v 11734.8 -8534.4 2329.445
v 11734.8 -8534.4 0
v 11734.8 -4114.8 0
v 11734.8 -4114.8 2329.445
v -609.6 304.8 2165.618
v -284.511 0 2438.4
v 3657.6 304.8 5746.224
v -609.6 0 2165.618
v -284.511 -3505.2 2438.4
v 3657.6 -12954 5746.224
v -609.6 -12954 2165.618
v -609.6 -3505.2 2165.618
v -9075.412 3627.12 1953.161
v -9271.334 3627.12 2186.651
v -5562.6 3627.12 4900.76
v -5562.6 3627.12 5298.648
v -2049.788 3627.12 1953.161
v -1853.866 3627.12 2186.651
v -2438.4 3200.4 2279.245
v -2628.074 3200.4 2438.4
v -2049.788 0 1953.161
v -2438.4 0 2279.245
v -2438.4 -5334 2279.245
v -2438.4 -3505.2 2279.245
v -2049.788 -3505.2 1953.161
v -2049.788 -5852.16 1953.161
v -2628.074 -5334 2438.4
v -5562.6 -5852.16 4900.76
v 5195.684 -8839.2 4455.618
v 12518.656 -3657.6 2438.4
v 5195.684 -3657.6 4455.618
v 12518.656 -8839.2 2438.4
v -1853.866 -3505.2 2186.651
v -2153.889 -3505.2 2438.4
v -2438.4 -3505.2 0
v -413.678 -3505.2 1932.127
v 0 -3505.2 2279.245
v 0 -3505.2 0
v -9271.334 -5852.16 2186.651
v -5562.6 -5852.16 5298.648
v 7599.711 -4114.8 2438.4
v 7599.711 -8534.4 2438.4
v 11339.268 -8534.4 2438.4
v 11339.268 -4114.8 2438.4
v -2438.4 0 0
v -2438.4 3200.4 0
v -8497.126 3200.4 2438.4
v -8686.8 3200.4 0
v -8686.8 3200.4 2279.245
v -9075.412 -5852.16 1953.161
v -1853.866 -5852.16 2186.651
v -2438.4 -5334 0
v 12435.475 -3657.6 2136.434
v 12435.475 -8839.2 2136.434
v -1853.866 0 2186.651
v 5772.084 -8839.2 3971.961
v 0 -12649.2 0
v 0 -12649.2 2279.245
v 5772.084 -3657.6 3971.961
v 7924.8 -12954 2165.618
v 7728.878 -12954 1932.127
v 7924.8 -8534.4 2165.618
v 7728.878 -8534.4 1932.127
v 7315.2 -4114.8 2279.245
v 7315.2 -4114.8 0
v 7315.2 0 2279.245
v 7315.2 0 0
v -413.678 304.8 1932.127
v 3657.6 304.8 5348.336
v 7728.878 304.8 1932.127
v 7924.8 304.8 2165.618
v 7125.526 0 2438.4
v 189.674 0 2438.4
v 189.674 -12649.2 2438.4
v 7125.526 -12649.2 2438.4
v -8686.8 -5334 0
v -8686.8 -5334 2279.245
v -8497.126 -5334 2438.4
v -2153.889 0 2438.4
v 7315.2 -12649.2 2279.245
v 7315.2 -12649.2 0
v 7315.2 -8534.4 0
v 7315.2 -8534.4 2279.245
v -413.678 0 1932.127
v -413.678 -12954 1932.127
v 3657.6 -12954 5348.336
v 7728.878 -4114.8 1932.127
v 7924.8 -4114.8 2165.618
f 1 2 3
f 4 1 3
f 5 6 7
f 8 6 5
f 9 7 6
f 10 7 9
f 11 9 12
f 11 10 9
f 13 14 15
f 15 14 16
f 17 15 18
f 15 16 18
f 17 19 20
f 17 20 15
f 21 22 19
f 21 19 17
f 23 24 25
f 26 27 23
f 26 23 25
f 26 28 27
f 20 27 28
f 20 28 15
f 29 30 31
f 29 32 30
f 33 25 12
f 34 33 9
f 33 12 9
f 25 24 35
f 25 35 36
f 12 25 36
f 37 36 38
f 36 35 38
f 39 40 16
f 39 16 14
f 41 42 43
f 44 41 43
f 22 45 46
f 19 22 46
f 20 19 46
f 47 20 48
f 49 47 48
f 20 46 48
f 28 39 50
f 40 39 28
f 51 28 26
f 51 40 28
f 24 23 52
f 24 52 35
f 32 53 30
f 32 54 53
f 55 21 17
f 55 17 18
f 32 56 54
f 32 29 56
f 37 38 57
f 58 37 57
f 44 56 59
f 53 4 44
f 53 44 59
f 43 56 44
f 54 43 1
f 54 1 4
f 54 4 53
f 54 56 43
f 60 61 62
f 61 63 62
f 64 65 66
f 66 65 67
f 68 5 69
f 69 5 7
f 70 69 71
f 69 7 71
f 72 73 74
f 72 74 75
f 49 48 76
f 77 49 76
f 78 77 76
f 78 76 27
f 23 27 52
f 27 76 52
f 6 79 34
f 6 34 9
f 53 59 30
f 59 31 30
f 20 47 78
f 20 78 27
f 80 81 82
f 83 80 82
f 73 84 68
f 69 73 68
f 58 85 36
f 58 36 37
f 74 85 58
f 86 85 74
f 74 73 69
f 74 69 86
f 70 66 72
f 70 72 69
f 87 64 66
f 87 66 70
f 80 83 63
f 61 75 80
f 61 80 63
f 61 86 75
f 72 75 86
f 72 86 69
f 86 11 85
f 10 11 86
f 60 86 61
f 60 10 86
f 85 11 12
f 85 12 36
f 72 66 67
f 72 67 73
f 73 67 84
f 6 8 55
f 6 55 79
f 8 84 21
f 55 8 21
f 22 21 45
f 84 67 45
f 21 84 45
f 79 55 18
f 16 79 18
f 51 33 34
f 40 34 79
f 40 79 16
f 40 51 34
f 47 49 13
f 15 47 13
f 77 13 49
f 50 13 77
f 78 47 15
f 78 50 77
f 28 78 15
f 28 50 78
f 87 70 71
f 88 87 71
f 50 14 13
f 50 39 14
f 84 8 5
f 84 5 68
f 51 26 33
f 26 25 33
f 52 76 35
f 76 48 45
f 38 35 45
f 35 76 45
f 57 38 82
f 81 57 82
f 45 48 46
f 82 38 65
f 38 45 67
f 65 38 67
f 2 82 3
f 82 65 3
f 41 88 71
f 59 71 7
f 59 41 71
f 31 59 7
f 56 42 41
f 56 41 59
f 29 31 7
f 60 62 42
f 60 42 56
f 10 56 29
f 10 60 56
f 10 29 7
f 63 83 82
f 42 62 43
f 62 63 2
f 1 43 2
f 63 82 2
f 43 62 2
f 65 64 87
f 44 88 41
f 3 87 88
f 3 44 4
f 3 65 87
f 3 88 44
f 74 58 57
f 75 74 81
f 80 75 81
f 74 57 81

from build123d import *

# Parameters (mm, degrees)
F0_W          = 7315.2
F0_H          = 3352.8
F0_W_2        = 2438.4
F0_H_2        = 3505.2
F0_W_3        = 4419.6
F0_H_3        = 4419.6
F1_DEPTH      = 2438.4
F3_DEPTH      = 304.8
F3_DEPTH_BACK = 12954
F5_DEPTH      = 304.8
F5_DEPTH_BACK = 4876.8
F7_DEPTH      = 518.16
F7_DEPTH_BACK = 8961.12


with BuildPart() as f1:
    # F0 (on Top) → F1 (new body)
    with BuildSketch(Plane.XY):
        Polygon((7315.2, 0), (0, 0), (0, -3505.2), (0, -9296.4), (7315.2, -9296.4), (7315.2, -8534.4), (7315.2, -4114.8), align=None)
        with Locations((3657.6, -10972.8)):
            Rectangle(F0_W, F0_H)
        with Locations((-1219.2, -1752.6)):
            Rectangle(F0_W_2, F0_H_2)
        with Locations((9525, -6324.6)):
            Rectangle(F0_W_3, F0_H_3)
        Polygon((-2438.4, -3505.2), (-2438.4, 0), (-2438.4, 3200.4), (-8686.8, 3200.4), (-8686.8, -5334), (-2438.4, -5334), align=None)
    extrude(amount=F1_DEPTH)

    # F2 (on face) → F3 (join, two sides)
    with BuildSketch(Plane.XZ.offset(12649.2)) as f3_sk:
        Polygon((189.6738489708, 2438.4), (3657.6, 5348.3355542786), (3657.6, 5746.2236960671), (-609.6, 2165.6177499074), (-413.6783365675, 1932.1274036448), (0, 2279.2447432846), (0, 2438.4), align=None)
        Polygon((3657.6, 5746.2236960671), (3657.6, 5348.3355542786), (7125.5261510292, 2438.4), (7315.2, 2438.4), (7315.2, 2279.2447432846), (7728.8783365675, 1932.1274036448), (7924.8, 2165.6177499074), align=None)
        Polygon((0, 2279.2447432846), (189.6738489708, 2438.4), (0, 2438.4), align=None)
        Polygon((7315.2, 2438.4), (7125.5261510292, 2438.4), (7315.2, 2279.2447432846), align=None)
    extrude(amount=F3_DEPTH)
    extrude(f3_sk.sketch, amount=-F3_DEPTH_BACK)

    # F4 (on face) → F5 (join, two sides)
    with BuildSketch(Plane.XZ.offset(8534.4)) as f5_sk:
        Polygon((5195.6838666947, 4455.6180908039), (5772.0840919647, 3971.9608743693), (12435.4748210193, 2136.4339087914), (12518.6557308055, 2438.4), align=None)
    extrude(amount=F5_DEPTH)
    extrude(f5_sk.sketch, amount=-F5_DEPTH_BACK)

    # F6 (on face) → F7 (join, two sides)
    with BuildSketch(Plane.XZ.offset(5334)) as f7_sk:
        Polygon((-9075.4120271523, 1953.16053463), (-5562.6, 4900.7598110087), (-5562.6, 5298.6479527971), (-9271.3336905848, 2186.6508808927), align=None)
        Polygon((-5562.6, 5298.6479527971), (-5562.6, 4900.7598110087), (-2049.7879728477, 1953.16053463), (-1853.8663094152, 2186.6508808927), align=None)
    extrude(amount=F7_DEPTH)
    extrude(f7_sk.sketch, amount=-F7_DEPTH_BACK)


solid = f1.part
